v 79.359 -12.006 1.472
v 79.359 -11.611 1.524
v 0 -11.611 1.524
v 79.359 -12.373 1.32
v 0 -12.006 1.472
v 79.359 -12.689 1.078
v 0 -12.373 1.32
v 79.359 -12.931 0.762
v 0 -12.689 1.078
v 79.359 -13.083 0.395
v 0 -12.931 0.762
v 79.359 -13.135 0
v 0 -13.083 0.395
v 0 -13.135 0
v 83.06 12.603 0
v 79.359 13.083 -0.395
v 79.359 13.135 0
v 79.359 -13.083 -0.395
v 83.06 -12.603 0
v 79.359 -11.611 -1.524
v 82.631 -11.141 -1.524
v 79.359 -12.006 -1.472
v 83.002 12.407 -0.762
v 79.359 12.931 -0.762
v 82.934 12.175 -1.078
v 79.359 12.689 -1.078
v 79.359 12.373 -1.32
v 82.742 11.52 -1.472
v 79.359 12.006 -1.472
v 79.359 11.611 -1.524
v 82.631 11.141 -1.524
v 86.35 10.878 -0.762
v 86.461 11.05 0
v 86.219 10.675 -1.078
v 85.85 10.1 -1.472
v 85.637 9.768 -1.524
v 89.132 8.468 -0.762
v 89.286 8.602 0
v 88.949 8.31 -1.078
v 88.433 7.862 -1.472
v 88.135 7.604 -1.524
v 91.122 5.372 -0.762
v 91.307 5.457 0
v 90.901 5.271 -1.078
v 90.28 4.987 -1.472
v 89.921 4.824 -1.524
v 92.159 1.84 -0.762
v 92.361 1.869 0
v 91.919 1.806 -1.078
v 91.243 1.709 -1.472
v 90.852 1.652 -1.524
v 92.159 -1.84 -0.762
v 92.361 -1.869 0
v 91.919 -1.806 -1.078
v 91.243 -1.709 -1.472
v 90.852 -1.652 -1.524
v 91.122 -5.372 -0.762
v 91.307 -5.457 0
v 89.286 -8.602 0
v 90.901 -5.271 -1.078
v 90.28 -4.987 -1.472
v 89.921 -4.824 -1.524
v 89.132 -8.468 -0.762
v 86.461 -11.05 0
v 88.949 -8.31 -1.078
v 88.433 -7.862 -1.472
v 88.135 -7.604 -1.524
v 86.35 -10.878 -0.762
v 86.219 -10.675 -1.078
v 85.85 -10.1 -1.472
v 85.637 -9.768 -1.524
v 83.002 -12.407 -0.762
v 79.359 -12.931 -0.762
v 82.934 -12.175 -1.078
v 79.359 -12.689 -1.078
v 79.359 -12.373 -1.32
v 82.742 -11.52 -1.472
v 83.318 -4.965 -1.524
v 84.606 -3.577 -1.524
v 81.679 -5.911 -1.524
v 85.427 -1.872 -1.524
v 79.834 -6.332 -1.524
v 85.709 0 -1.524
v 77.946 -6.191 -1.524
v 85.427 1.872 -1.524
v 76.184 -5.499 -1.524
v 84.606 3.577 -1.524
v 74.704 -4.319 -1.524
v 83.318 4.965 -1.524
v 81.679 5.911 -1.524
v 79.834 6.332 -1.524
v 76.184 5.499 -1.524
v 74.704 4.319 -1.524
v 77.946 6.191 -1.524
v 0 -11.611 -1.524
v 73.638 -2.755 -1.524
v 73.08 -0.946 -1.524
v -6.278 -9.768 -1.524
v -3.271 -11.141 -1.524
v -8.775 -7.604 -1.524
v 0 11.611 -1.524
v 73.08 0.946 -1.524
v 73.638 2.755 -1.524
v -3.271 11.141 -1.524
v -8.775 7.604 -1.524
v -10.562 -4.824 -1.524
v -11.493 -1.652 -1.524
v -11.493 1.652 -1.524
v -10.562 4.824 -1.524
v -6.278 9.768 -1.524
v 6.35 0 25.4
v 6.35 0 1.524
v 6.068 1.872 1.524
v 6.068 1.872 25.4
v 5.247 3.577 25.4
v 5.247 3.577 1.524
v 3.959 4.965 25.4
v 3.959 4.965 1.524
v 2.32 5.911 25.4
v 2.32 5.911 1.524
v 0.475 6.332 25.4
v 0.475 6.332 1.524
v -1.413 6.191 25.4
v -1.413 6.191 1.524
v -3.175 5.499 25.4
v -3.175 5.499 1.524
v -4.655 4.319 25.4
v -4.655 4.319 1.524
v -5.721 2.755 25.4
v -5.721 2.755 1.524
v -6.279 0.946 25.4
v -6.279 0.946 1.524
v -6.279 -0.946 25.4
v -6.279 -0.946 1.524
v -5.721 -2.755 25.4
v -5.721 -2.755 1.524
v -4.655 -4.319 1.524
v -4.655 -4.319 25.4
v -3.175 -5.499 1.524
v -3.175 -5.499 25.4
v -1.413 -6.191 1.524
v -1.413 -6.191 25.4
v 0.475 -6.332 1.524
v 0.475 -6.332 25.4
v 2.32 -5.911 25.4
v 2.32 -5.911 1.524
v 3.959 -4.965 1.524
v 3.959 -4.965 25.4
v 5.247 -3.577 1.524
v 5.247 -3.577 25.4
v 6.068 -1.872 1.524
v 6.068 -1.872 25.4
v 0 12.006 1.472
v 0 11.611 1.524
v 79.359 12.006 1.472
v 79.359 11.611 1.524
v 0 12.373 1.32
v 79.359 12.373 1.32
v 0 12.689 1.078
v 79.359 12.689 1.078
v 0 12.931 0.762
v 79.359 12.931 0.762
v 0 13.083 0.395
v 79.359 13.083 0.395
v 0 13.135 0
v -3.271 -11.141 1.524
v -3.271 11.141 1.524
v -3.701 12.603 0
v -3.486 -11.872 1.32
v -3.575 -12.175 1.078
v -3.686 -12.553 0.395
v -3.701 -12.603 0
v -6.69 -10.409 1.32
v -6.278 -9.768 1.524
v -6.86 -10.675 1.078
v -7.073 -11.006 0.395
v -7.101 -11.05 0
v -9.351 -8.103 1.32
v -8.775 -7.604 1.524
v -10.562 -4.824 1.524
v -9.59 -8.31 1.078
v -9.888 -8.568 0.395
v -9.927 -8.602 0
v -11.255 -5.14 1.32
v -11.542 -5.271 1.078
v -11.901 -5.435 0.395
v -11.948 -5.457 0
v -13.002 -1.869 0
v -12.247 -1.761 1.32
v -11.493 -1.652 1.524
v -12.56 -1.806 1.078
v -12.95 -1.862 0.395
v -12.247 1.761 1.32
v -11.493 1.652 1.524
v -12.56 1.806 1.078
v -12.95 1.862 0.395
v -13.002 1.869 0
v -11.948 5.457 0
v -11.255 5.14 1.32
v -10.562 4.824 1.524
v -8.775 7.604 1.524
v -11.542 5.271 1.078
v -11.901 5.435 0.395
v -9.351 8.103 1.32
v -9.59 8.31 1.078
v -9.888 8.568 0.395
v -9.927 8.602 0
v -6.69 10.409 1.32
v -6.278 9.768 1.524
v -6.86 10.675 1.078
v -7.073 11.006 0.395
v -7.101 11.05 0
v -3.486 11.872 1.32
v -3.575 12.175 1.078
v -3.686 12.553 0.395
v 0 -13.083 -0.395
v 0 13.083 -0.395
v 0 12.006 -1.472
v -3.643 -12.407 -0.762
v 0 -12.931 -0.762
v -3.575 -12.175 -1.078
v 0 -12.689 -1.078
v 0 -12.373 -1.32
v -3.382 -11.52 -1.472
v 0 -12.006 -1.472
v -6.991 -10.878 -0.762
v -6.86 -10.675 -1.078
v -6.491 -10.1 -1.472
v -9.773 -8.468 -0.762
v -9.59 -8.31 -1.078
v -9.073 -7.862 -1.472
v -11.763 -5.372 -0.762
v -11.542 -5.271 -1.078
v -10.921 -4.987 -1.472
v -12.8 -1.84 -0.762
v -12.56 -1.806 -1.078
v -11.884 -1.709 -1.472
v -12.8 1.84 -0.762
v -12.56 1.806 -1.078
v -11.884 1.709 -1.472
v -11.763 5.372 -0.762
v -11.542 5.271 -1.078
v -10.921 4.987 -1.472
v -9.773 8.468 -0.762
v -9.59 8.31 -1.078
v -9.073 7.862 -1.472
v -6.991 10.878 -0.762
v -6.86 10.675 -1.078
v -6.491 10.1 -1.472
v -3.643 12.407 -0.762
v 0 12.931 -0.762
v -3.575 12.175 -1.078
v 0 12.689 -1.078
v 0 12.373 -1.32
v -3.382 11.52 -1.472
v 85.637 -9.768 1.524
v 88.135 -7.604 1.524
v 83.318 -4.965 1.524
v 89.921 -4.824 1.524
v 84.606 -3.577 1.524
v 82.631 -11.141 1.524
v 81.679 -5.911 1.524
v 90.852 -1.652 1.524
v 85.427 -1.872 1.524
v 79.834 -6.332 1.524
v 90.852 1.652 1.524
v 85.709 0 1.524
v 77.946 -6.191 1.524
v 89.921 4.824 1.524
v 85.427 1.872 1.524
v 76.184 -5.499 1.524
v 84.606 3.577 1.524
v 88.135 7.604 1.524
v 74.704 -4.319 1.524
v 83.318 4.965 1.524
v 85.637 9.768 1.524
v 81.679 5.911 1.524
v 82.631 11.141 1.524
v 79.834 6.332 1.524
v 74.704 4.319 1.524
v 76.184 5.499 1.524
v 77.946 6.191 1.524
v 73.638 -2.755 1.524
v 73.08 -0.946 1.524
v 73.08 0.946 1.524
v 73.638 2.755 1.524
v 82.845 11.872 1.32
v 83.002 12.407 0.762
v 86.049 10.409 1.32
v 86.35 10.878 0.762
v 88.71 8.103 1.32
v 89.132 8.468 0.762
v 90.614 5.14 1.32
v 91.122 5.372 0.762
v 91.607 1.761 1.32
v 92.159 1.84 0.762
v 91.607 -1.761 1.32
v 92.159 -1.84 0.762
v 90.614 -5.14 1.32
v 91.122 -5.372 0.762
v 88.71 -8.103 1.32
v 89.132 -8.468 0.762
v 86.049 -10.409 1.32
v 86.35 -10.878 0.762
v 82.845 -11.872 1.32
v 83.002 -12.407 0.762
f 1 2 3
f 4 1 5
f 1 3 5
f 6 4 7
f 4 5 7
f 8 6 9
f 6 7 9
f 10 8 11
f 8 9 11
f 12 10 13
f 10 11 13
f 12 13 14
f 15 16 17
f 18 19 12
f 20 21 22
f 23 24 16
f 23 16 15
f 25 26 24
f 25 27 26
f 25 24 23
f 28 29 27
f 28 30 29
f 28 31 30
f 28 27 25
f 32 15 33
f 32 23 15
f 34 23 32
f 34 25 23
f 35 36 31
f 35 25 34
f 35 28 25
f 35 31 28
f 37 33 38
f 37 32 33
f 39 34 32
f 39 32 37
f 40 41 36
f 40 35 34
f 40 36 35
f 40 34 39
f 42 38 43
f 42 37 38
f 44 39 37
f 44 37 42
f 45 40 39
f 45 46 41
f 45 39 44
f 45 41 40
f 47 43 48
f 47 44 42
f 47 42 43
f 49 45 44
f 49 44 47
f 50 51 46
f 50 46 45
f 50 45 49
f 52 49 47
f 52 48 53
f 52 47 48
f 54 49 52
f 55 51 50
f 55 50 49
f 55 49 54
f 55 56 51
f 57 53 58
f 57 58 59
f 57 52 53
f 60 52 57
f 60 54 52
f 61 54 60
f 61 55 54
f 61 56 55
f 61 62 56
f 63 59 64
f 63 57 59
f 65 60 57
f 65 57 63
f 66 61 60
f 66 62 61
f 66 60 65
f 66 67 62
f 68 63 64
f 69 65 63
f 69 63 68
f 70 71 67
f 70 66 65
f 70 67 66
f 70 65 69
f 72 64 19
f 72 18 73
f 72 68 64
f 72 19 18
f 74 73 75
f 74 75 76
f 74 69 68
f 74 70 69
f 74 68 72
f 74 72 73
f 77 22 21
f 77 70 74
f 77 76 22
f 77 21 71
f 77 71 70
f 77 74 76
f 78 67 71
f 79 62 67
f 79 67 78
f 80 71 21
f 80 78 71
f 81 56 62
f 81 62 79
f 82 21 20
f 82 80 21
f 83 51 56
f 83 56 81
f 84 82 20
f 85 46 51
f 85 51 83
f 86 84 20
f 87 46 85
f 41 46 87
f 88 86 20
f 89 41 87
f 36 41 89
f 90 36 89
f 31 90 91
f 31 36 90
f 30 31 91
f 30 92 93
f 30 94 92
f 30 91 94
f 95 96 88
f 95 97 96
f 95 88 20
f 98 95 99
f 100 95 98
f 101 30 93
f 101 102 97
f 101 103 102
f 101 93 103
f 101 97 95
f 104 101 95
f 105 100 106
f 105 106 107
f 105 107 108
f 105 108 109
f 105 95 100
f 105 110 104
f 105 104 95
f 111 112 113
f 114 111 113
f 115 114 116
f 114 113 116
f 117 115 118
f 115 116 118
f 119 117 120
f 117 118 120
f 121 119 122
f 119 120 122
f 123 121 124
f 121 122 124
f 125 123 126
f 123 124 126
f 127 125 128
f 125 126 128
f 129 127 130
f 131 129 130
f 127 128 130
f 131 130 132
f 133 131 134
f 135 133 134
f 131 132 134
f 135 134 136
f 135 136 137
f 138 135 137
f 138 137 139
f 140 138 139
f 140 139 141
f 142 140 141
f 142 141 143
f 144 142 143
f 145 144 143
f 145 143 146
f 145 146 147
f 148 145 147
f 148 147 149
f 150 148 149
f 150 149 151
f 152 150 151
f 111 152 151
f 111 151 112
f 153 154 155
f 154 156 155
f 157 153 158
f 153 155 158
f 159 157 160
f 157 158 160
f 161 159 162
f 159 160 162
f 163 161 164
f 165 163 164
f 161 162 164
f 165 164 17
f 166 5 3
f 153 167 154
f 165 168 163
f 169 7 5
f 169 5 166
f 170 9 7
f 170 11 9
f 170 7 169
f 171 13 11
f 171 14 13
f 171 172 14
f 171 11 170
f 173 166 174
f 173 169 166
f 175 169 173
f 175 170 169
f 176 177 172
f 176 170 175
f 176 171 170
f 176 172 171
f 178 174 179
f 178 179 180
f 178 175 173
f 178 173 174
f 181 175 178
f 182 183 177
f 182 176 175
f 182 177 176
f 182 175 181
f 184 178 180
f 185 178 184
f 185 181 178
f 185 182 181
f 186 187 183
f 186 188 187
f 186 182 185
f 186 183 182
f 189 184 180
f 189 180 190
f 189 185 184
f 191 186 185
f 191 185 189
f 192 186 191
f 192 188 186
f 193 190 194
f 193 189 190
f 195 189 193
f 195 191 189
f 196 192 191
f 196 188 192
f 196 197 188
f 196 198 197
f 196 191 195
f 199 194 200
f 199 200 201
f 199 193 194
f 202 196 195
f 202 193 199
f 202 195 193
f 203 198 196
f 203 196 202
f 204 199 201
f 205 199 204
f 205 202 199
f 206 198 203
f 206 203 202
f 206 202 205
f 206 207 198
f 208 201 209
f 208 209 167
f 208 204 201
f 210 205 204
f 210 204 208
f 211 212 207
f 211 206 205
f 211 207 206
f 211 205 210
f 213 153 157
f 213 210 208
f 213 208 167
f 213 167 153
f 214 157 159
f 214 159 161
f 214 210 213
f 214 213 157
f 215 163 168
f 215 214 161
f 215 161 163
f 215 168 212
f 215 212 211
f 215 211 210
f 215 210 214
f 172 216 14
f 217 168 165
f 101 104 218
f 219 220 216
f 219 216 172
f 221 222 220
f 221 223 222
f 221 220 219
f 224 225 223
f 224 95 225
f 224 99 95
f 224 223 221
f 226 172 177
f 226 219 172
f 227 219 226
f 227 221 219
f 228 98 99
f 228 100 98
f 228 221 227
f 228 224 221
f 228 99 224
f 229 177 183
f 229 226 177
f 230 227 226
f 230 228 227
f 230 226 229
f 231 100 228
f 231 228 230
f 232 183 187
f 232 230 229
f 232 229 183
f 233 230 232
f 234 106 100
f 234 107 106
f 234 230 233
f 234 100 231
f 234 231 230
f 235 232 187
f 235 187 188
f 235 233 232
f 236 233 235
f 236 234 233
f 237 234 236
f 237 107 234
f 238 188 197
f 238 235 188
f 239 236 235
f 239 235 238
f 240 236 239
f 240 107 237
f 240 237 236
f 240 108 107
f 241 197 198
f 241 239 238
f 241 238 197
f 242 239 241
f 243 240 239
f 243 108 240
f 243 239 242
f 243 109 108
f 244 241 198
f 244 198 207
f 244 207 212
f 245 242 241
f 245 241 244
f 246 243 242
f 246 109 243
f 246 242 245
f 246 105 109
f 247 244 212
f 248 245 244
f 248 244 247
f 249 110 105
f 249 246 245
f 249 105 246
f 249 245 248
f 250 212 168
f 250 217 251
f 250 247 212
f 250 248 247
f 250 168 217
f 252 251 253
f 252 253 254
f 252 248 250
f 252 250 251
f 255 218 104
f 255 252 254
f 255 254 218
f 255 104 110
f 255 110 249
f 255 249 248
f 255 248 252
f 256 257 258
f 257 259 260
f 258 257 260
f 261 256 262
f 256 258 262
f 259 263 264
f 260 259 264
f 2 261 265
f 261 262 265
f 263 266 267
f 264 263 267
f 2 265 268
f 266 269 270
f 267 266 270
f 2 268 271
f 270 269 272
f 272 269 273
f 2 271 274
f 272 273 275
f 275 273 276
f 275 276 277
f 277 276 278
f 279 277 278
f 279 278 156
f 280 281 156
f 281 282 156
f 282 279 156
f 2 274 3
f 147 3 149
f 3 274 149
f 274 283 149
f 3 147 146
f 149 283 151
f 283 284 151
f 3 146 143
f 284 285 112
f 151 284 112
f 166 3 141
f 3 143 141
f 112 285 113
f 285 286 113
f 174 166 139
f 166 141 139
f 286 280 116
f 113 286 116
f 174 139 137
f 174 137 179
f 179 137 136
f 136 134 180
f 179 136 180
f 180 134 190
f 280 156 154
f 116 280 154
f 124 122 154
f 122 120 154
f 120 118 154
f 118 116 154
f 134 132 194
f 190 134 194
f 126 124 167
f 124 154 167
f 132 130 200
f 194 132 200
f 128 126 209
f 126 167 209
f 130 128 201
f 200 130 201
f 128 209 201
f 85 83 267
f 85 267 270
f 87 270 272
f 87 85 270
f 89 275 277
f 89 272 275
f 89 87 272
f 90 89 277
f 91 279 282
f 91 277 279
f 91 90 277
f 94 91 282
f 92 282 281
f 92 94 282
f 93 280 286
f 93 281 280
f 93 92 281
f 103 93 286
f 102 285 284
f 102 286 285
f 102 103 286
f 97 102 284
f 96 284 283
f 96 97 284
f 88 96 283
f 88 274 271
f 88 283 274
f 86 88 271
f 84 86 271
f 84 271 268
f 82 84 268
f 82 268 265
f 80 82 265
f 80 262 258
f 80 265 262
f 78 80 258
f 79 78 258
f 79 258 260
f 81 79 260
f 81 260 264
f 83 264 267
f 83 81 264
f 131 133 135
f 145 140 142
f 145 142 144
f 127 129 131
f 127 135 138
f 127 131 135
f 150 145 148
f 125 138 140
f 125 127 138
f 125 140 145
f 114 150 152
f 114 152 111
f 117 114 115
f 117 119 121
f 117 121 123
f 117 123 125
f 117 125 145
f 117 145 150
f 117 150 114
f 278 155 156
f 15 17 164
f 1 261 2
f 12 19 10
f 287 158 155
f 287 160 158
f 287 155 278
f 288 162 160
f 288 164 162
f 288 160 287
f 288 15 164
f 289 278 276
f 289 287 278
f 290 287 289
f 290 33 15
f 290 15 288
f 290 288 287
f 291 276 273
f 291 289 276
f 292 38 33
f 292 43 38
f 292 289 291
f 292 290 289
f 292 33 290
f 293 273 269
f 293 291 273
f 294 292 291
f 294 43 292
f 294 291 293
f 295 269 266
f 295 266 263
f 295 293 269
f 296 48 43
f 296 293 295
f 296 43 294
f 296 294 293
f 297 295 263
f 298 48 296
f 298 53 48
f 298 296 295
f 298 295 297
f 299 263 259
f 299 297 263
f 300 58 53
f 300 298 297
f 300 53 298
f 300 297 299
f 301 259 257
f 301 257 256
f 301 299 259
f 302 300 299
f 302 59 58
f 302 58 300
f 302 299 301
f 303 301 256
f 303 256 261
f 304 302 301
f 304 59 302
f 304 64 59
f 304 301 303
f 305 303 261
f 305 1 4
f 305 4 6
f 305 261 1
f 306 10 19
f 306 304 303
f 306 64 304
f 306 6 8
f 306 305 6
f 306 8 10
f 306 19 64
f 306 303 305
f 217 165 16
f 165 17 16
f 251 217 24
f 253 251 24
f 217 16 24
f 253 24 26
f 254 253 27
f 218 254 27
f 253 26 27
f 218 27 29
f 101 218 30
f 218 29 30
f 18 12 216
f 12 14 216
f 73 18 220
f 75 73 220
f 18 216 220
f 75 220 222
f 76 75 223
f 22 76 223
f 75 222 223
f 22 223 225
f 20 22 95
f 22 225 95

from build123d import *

# Parameters (mm, degrees)
BOSS_EXTRUDE1_DEPTH     = 1.524
FILLET1_R               = 1.524
SKETCH3_R               = 6.35
BOSS_EXTRUDE3_DEPTH     = 25.4
CUT_EXTRUDE4_DEPTH      = 97.813899613
CUT_EXTRUDE4_DEPTH_BACK = 97.813899613
SKETCH5_R               = 6.35


with BuildPart() as part:
    # Sketch2 → Boss-Extrude1 (new, symmetric)
    with BuildSketch(Plane.XY):
        with BuildLine():
            Line((0, 13.135315222), (79.359196135, 13.135315222))
            ThreePointArc((79.359196135, 13.135315222), (92.494511357, 0), (79.359196135, -13.135315222))
            Line((79.359196135, -13.135315222), (0, -13.135315222))
            ThreePointArc((0, -13.135315222), (-13.135315222, 0), (0, 13.135315222))
        make_face()
    extrude(amount=BOSS_EXTRUDE1_DEPTH, both=True)

    # Fillet1
    fillet1_edges = [part.edges().sort_by_distance(p)[0] for p in [
        (92.494511357, 0, -1.524),
        (39.679598067, -13.135315222, -1.524),
        (-13.135315222, 0, -1.524),
        (92.494511357, 0, 1.524),
        (39.679598067, -13.135315222, 1.524),
        (-13.135315222, 0, 1.524),
        (39.679598067, 13.135315222, -1.524),
        (39.679598067, 13.135315222, 1.524),
    ]]
    fillet(fillet1_edges, radius=FILLET1_R - 0.0001)  # a hair under: the kernel refuses the full size

    # Sketch3 → Boss-Extrude3 (add)
    with BuildSketch(Plane.XY):
        Circle(SKETCH3_R)
    extrude(amount=BOSS_EXTRUDE3_DEPTH)

    # Sketch5 → Cut-Extrude4 (cut, two sides: drawn at the far end of the back side and taken through both)
    with BuildSketch(Plane.XY.offset(-CUT_EXTRUDE4_DEPTH_BACK)):
        with Locations((79.359196135, 0)):
            Circle(SKETCH5_R)
    extrude(amount=CUT_EXTRUDE4_DEPTH + CUT_EXTRUDE4_DEPTH_BACK, mode=Mode.SUBTRACT)


solid = part.part
